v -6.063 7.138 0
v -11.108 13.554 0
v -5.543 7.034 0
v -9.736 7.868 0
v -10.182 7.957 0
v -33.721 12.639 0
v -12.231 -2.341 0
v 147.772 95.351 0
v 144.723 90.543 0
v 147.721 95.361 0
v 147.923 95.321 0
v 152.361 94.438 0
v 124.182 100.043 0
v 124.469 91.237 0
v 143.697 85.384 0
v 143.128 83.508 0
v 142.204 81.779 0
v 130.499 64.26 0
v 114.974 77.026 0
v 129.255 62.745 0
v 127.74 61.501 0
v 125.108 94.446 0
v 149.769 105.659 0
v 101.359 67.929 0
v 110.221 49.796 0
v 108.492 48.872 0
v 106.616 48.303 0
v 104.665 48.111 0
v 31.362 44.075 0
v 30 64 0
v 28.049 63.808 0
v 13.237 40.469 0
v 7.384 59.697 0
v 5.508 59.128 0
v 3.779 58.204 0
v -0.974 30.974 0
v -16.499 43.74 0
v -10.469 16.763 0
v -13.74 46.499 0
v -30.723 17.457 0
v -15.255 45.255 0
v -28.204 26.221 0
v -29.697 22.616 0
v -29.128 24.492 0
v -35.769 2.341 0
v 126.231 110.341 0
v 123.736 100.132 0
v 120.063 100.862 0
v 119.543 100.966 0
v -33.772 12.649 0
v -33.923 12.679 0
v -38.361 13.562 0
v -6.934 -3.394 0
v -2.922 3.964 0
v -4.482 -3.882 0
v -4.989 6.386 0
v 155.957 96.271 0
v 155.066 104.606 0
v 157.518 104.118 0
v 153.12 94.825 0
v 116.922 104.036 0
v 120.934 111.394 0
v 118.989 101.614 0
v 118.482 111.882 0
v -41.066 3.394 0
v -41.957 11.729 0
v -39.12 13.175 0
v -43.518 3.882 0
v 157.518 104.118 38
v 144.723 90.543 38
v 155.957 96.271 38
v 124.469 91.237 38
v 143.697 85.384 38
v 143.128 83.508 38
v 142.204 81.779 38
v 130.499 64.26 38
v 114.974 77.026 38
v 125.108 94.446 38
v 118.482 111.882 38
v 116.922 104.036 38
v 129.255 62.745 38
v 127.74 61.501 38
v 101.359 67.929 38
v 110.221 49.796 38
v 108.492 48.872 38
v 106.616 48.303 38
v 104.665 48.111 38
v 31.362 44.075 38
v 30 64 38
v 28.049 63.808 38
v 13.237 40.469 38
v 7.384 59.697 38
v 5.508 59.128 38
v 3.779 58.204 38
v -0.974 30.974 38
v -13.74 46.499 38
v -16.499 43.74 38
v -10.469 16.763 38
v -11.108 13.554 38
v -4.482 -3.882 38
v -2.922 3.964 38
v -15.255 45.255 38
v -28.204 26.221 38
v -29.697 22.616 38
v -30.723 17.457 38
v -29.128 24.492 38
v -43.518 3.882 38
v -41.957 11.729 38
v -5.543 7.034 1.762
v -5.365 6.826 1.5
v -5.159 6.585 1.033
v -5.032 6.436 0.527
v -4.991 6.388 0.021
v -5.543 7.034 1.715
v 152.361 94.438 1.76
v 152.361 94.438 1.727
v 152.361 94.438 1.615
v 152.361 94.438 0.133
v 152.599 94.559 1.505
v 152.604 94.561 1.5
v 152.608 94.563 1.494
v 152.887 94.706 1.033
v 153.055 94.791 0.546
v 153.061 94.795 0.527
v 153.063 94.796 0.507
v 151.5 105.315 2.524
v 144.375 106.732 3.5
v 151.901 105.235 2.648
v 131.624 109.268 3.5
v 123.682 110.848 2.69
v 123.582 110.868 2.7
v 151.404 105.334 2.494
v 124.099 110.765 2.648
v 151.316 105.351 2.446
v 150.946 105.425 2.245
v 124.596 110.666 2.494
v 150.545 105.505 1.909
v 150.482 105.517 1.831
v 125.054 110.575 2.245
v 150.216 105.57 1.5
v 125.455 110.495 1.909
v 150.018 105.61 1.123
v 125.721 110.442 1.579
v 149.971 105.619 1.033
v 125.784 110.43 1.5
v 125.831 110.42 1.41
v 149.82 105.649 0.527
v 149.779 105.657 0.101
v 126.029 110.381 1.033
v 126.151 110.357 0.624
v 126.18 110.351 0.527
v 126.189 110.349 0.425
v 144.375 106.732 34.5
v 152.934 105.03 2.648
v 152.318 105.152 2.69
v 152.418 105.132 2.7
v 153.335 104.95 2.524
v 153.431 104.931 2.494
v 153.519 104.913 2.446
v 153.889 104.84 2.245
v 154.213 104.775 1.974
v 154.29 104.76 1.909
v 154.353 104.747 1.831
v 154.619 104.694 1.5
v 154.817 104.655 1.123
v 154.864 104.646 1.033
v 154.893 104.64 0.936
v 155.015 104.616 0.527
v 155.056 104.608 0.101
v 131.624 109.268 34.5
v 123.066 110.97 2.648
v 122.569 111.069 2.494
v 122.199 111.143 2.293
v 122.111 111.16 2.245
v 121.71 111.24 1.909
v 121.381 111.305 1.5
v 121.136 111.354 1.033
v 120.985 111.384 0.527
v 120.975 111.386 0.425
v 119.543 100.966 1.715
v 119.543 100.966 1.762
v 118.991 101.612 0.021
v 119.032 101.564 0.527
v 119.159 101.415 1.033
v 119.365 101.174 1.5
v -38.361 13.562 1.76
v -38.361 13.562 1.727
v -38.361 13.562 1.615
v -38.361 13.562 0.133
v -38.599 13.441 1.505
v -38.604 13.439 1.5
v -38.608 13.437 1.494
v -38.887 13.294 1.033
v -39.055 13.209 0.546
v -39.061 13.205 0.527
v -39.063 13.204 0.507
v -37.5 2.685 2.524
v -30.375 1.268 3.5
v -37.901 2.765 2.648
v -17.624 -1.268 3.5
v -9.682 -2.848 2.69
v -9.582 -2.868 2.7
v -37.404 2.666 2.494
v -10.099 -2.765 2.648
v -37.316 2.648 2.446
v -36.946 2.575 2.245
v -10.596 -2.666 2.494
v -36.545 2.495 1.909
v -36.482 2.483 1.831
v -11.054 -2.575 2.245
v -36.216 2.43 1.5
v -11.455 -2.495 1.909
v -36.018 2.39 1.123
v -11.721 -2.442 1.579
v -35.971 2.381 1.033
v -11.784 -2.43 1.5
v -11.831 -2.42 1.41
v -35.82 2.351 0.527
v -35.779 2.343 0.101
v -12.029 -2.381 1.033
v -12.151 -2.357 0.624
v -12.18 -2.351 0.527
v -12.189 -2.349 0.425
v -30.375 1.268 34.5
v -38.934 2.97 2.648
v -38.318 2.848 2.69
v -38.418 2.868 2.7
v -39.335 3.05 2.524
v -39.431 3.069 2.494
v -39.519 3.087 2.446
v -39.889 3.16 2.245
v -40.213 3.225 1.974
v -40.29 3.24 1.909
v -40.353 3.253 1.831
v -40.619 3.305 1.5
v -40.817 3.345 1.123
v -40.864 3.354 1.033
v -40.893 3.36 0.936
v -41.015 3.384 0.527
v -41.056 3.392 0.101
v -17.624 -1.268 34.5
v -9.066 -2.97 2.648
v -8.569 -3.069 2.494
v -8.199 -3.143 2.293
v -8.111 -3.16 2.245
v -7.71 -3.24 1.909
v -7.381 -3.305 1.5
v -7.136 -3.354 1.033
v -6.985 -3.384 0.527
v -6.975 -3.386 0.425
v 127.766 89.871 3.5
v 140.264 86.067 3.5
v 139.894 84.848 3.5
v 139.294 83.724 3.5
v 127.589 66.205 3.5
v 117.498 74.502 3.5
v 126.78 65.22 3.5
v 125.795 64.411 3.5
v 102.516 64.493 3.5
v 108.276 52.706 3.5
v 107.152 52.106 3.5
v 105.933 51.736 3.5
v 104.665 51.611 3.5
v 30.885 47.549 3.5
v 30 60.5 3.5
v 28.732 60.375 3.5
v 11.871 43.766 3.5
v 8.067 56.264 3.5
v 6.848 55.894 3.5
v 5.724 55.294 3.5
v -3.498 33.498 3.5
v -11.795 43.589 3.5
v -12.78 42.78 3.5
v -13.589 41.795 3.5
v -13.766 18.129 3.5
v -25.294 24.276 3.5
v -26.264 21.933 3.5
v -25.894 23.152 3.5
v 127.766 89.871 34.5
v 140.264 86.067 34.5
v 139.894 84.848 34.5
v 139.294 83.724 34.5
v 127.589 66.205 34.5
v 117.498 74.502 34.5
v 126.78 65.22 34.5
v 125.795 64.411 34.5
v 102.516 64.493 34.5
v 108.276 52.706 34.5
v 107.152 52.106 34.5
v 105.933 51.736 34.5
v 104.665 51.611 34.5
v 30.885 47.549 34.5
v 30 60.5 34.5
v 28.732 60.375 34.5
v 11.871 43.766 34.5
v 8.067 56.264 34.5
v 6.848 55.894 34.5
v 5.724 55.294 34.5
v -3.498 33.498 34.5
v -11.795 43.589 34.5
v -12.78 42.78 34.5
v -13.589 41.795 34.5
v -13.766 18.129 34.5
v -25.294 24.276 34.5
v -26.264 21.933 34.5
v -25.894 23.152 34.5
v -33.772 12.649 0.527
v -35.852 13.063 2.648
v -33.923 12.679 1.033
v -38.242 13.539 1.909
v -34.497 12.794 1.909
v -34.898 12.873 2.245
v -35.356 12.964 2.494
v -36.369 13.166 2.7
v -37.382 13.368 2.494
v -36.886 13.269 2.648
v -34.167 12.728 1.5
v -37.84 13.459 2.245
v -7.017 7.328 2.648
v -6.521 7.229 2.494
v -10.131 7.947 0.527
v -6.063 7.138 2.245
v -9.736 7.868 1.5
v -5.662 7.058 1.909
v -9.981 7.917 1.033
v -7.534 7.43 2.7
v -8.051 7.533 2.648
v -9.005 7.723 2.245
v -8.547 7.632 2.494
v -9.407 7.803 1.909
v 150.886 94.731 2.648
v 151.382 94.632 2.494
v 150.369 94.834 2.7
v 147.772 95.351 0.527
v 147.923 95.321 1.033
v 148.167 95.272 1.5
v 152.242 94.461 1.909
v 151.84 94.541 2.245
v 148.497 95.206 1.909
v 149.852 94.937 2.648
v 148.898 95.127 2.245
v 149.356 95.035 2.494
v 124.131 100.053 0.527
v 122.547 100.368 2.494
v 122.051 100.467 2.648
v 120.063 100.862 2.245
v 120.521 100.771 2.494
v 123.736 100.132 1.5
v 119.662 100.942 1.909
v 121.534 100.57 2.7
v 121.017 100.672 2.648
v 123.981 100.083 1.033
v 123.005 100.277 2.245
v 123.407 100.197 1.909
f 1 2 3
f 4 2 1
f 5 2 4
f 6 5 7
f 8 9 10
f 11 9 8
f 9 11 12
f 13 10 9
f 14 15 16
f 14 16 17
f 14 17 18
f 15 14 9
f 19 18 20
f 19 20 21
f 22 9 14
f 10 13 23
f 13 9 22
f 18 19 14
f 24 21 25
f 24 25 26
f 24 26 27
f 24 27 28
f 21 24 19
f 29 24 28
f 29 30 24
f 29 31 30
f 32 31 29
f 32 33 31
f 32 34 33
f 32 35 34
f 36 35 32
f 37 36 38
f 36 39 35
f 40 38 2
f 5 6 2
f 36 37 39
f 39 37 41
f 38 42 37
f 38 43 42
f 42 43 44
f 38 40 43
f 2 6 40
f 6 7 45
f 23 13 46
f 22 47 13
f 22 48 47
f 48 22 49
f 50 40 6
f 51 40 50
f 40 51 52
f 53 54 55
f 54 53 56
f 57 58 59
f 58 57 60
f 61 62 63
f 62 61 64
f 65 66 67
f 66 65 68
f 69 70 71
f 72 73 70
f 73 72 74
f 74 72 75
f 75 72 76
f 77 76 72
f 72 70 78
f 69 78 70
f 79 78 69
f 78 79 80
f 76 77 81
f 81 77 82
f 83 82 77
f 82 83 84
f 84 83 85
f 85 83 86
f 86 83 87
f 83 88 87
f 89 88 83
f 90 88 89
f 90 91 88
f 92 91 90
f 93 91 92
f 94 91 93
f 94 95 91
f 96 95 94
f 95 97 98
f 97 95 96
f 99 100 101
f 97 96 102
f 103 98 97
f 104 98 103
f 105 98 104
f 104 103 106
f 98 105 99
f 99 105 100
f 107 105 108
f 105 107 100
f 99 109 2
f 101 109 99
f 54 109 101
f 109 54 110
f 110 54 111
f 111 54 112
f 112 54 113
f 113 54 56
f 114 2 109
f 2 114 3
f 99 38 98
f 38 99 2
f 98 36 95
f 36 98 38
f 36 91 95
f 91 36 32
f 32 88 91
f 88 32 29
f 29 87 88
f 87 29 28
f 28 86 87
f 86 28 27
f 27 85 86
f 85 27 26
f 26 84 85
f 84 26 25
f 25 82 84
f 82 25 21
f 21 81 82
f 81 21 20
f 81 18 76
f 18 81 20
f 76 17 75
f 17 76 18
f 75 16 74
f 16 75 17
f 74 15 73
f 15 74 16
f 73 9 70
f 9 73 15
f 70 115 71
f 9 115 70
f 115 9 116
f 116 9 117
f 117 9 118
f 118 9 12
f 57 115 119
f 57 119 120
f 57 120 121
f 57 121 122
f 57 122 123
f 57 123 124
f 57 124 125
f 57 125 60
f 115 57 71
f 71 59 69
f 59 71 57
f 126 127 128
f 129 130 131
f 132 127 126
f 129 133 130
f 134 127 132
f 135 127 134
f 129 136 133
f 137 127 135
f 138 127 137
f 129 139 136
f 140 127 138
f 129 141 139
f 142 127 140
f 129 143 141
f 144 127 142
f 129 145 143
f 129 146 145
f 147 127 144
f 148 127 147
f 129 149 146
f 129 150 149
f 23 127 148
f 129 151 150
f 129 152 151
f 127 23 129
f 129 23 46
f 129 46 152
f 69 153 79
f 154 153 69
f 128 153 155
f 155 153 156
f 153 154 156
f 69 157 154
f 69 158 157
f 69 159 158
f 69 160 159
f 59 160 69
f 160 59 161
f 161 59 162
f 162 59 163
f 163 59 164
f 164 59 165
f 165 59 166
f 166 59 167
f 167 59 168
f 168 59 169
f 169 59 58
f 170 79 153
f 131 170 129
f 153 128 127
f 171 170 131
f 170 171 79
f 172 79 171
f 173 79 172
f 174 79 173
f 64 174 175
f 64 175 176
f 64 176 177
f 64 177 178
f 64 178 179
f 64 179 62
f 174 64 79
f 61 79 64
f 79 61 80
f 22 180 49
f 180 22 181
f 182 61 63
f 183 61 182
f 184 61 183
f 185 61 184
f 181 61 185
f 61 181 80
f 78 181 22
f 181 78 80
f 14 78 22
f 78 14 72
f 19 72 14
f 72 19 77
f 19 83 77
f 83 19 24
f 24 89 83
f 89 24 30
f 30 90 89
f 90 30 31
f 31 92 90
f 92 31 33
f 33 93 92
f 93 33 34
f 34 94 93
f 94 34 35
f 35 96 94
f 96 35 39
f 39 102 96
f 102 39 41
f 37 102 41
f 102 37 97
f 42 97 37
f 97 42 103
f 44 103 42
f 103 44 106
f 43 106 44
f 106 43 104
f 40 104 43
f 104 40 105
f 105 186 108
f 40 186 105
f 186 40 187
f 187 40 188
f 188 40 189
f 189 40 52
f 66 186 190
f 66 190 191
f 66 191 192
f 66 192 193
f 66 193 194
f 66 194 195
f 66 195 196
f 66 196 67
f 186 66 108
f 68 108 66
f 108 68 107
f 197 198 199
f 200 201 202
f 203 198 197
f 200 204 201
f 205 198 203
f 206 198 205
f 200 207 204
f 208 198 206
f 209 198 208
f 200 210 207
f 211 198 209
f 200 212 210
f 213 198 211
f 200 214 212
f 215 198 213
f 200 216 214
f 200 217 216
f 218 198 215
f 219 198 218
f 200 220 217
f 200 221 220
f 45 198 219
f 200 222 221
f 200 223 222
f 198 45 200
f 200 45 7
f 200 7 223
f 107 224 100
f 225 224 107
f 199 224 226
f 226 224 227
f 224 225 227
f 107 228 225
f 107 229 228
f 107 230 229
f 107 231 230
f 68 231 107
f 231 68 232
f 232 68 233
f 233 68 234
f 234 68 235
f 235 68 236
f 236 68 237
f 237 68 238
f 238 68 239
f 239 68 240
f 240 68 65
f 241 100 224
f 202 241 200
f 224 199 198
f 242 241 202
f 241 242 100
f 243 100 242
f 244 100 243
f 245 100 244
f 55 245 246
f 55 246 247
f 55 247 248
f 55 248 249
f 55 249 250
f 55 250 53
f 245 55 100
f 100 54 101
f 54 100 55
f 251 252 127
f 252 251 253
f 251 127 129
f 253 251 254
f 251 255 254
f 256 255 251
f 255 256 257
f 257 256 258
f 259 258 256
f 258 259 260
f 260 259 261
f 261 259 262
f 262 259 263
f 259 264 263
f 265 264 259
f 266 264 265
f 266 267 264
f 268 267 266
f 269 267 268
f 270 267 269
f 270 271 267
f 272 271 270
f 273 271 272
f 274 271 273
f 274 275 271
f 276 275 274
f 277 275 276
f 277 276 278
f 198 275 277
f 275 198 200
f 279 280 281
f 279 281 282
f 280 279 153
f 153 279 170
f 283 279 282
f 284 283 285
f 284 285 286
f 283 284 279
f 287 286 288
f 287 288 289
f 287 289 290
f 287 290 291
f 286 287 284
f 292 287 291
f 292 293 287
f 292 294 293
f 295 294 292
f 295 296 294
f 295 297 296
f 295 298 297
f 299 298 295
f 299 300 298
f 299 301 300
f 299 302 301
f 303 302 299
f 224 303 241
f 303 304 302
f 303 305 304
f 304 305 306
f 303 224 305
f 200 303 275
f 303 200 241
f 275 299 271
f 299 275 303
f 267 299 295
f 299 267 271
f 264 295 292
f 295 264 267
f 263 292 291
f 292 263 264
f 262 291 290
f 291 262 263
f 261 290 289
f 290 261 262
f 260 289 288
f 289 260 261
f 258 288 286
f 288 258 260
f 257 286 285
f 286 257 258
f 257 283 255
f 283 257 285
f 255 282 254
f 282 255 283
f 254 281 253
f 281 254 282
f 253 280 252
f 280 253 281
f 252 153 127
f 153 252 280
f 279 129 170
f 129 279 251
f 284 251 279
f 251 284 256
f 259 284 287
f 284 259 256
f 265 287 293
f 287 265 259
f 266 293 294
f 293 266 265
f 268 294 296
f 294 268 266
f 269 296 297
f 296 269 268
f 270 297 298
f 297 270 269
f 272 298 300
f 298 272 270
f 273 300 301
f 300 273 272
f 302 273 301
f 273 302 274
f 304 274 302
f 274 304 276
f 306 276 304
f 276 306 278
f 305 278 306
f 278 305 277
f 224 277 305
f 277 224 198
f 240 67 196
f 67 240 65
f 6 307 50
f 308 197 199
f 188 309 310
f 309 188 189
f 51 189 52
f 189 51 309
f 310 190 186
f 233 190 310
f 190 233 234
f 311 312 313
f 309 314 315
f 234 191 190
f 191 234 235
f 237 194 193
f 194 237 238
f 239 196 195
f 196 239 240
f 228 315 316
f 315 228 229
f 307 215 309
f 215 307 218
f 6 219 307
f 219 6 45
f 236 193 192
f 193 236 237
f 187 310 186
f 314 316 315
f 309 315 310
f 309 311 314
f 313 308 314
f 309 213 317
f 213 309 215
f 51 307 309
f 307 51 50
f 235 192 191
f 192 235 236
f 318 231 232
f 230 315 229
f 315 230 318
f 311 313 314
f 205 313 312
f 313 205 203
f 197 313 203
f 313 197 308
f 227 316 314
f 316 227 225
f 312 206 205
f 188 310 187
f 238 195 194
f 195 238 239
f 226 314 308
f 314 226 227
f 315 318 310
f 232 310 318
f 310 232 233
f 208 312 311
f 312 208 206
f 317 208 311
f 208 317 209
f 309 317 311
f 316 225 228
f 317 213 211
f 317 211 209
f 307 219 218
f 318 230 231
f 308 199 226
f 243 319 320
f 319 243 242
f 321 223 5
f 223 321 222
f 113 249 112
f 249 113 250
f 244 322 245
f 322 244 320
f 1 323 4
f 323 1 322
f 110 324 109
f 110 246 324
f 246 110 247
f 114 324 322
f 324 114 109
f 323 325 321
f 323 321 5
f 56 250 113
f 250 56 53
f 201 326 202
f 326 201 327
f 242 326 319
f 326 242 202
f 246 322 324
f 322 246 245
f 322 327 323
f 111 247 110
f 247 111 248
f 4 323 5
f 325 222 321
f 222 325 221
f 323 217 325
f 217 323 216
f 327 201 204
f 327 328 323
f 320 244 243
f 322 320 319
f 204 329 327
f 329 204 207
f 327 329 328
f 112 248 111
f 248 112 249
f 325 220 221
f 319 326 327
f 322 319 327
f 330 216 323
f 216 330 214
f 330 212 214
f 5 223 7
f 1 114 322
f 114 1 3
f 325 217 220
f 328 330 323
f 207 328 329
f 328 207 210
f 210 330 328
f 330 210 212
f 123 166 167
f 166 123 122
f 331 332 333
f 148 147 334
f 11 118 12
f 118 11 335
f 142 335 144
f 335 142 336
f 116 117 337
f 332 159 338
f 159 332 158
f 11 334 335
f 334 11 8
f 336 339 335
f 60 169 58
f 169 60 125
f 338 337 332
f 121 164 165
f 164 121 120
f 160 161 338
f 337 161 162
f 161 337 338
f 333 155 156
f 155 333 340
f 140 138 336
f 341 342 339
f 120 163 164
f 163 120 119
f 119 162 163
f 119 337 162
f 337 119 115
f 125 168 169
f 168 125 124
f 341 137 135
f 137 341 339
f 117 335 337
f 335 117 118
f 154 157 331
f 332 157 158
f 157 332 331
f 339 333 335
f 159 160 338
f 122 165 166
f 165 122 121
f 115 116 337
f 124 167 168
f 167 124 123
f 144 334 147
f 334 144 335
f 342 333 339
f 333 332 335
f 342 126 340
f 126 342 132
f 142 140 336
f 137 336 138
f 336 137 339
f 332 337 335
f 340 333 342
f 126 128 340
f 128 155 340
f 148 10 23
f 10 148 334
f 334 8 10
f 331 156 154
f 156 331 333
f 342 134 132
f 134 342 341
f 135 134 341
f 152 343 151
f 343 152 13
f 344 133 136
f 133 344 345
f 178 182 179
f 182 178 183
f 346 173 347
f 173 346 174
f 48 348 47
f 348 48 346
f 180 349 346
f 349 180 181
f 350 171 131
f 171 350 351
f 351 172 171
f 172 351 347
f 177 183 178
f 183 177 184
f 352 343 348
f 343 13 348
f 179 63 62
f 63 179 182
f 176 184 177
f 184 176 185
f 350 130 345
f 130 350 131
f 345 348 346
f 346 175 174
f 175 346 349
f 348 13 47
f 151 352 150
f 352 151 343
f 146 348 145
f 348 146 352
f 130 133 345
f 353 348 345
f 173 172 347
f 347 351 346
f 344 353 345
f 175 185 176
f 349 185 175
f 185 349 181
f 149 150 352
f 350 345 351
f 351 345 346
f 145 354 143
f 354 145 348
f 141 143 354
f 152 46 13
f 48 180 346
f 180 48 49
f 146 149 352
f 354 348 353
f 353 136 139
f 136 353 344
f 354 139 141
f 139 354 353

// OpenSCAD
$fn = 32;

// ----------------------------------------------------------------------
// Air duct: 20 mm duct, 3.5 mm wall, 38 mm across
// ----------------------------------------------------------------------

// --- parameters (mm) ---
duct_r = 10;              // duct core radius
duct_d = 20;              // duct core diameter
wall = 3.5;               // duct wall thickness
height = 38;              // duct width (extrusion height)
port_r = 19.9;            // port flange half width
port_d = 39.8;            // port flange width
port_t = 8;               // port flange thickness
bolt_d = 5.4;             // port bolt holes
bolt_offset = 14.7;       // bolt hole offset from the port axis

difference() {
  /* outer hull chain: tube with a flat flange plate at every port */
  linear_extrude(height = 38) {
    hull() {
      polygon([[-4.482, -3.882], [-43.518, 3.882], [-41.957, 11.729], [-2.922, 3.964]]);
      translate([-21.854, 10.789]) circle(r = 10);
    }
    hull() {
      translate([-21.854, 10.789]) circle(r = 10);
      translate([-19.889, 20.665]) circle(r = 10);
    }
    hull() {
      translate([-19.889, 20.665]) circle(r = 10);
      translate([-8.184, 38.184]) circle(r = 10);
    }
    hull() {
      translate([-8.184, 38.184]) circle(r = 10);
      translate([9.335, 49.889]) circle(r = 10);
    }
    hull() {
      translate([9.335, 49.889]) circle(r = 10);
      translate([30, 54]) circle(r = 10);
    }
    hull() {
      translate([30, 54]) circle(r = 10);
      translate([104.665, 58.111]) circle(r = 10);
    }
    hull() {
      translate([104.665, 58.111]) circle(r = 10);
      translate([122.184, 69.816]) circle(r = 10);
    }
    hull() {
      translate([122.184, 69.816]) circle(r = 10);
      translate([133.889, 87.335]) circle(r = 10);
    }
    hull() {
      translate([133.889, 87.335]) circle(r = 10);
      translate([135.854, 97.211]) circle(r = 10);
    }
    hull() {
      translate([135.854, 97.211]) circle(r = 10);
      polygon([[118.482, 111.882], [157.518, 104.118], [155.957, 96.271], [116.922, 104.036]]);
    }
  }
  /* air passage: the same chain inset by the wall, 5 mm proud of the ports */
  translate([0, 0, 3.5]) linear_extrude(height = 31) {
    hull() {
      translate([-24.975, -4.904]) circle(r = 6.5);
      translate([-19.889, 20.665]) circle(r = 6.5);
    }
    hull() {
      translate([-19.889, 20.665]) circle(r = 6.5);
      translate([-8.184, 38.184]) circle(r = 6.5);
    }
    hull() {
      translate([-8.184, 38.184]) circle(r = 6.5);
      translate([9.335, 49.889]) circle(r = 6.5);
    }
    hull() {
      translate([9.335, 49.889]) circle(r = 6.5);
      translate([30, 54]) circle(r = 6.5);
    }
    hull() {
      translate([30, 54]) circle(r = 6.5);
      translate([104.665, 58.111]) circle(r = 6.5);
    }
    hull() {
      translate([104.665, 58.111]) circle(r = 6.5);
      translate([122.184, 69.816]) circle(r = 6.5);
    }
    hull() {
      translate([122.184, 69.816]) circle(r = 6.5);
      translate([133.889, 87.335]) circle(r = 6.5);
    }
    hull() {
      translate([133.889, 87.335]) circle(r = 6.5);
      translate([138.975, 112.904]) circle(r = 6.5);
    }
  }
  translate([-24, 0]) rotate([0, 0, -11.25]) translate([-14.7, -2.5]) rotate([-90, 0, 0]) cylinder(h = 13, d = 5.4);
  translate([-24, 0]) rotate([0, 0, -11.25]) translate([14.7, -2.5]) rotate([-90, 0, 0]) cylinder(h = 13, d = 5.4);
  translate([138, 108]) rotate([0, 0, 168.75]) translate([-14.7, -2.5]) rotate([-90, 0, 0]) cylinder(h = 13, d = 5.4);
  translate([138, 108]) rotate([0, 0, 168.75]) translate([14.7, -2.5]) rotate([-90, 0, 0]) cylinder(h = 13, d = 5.4);
}
